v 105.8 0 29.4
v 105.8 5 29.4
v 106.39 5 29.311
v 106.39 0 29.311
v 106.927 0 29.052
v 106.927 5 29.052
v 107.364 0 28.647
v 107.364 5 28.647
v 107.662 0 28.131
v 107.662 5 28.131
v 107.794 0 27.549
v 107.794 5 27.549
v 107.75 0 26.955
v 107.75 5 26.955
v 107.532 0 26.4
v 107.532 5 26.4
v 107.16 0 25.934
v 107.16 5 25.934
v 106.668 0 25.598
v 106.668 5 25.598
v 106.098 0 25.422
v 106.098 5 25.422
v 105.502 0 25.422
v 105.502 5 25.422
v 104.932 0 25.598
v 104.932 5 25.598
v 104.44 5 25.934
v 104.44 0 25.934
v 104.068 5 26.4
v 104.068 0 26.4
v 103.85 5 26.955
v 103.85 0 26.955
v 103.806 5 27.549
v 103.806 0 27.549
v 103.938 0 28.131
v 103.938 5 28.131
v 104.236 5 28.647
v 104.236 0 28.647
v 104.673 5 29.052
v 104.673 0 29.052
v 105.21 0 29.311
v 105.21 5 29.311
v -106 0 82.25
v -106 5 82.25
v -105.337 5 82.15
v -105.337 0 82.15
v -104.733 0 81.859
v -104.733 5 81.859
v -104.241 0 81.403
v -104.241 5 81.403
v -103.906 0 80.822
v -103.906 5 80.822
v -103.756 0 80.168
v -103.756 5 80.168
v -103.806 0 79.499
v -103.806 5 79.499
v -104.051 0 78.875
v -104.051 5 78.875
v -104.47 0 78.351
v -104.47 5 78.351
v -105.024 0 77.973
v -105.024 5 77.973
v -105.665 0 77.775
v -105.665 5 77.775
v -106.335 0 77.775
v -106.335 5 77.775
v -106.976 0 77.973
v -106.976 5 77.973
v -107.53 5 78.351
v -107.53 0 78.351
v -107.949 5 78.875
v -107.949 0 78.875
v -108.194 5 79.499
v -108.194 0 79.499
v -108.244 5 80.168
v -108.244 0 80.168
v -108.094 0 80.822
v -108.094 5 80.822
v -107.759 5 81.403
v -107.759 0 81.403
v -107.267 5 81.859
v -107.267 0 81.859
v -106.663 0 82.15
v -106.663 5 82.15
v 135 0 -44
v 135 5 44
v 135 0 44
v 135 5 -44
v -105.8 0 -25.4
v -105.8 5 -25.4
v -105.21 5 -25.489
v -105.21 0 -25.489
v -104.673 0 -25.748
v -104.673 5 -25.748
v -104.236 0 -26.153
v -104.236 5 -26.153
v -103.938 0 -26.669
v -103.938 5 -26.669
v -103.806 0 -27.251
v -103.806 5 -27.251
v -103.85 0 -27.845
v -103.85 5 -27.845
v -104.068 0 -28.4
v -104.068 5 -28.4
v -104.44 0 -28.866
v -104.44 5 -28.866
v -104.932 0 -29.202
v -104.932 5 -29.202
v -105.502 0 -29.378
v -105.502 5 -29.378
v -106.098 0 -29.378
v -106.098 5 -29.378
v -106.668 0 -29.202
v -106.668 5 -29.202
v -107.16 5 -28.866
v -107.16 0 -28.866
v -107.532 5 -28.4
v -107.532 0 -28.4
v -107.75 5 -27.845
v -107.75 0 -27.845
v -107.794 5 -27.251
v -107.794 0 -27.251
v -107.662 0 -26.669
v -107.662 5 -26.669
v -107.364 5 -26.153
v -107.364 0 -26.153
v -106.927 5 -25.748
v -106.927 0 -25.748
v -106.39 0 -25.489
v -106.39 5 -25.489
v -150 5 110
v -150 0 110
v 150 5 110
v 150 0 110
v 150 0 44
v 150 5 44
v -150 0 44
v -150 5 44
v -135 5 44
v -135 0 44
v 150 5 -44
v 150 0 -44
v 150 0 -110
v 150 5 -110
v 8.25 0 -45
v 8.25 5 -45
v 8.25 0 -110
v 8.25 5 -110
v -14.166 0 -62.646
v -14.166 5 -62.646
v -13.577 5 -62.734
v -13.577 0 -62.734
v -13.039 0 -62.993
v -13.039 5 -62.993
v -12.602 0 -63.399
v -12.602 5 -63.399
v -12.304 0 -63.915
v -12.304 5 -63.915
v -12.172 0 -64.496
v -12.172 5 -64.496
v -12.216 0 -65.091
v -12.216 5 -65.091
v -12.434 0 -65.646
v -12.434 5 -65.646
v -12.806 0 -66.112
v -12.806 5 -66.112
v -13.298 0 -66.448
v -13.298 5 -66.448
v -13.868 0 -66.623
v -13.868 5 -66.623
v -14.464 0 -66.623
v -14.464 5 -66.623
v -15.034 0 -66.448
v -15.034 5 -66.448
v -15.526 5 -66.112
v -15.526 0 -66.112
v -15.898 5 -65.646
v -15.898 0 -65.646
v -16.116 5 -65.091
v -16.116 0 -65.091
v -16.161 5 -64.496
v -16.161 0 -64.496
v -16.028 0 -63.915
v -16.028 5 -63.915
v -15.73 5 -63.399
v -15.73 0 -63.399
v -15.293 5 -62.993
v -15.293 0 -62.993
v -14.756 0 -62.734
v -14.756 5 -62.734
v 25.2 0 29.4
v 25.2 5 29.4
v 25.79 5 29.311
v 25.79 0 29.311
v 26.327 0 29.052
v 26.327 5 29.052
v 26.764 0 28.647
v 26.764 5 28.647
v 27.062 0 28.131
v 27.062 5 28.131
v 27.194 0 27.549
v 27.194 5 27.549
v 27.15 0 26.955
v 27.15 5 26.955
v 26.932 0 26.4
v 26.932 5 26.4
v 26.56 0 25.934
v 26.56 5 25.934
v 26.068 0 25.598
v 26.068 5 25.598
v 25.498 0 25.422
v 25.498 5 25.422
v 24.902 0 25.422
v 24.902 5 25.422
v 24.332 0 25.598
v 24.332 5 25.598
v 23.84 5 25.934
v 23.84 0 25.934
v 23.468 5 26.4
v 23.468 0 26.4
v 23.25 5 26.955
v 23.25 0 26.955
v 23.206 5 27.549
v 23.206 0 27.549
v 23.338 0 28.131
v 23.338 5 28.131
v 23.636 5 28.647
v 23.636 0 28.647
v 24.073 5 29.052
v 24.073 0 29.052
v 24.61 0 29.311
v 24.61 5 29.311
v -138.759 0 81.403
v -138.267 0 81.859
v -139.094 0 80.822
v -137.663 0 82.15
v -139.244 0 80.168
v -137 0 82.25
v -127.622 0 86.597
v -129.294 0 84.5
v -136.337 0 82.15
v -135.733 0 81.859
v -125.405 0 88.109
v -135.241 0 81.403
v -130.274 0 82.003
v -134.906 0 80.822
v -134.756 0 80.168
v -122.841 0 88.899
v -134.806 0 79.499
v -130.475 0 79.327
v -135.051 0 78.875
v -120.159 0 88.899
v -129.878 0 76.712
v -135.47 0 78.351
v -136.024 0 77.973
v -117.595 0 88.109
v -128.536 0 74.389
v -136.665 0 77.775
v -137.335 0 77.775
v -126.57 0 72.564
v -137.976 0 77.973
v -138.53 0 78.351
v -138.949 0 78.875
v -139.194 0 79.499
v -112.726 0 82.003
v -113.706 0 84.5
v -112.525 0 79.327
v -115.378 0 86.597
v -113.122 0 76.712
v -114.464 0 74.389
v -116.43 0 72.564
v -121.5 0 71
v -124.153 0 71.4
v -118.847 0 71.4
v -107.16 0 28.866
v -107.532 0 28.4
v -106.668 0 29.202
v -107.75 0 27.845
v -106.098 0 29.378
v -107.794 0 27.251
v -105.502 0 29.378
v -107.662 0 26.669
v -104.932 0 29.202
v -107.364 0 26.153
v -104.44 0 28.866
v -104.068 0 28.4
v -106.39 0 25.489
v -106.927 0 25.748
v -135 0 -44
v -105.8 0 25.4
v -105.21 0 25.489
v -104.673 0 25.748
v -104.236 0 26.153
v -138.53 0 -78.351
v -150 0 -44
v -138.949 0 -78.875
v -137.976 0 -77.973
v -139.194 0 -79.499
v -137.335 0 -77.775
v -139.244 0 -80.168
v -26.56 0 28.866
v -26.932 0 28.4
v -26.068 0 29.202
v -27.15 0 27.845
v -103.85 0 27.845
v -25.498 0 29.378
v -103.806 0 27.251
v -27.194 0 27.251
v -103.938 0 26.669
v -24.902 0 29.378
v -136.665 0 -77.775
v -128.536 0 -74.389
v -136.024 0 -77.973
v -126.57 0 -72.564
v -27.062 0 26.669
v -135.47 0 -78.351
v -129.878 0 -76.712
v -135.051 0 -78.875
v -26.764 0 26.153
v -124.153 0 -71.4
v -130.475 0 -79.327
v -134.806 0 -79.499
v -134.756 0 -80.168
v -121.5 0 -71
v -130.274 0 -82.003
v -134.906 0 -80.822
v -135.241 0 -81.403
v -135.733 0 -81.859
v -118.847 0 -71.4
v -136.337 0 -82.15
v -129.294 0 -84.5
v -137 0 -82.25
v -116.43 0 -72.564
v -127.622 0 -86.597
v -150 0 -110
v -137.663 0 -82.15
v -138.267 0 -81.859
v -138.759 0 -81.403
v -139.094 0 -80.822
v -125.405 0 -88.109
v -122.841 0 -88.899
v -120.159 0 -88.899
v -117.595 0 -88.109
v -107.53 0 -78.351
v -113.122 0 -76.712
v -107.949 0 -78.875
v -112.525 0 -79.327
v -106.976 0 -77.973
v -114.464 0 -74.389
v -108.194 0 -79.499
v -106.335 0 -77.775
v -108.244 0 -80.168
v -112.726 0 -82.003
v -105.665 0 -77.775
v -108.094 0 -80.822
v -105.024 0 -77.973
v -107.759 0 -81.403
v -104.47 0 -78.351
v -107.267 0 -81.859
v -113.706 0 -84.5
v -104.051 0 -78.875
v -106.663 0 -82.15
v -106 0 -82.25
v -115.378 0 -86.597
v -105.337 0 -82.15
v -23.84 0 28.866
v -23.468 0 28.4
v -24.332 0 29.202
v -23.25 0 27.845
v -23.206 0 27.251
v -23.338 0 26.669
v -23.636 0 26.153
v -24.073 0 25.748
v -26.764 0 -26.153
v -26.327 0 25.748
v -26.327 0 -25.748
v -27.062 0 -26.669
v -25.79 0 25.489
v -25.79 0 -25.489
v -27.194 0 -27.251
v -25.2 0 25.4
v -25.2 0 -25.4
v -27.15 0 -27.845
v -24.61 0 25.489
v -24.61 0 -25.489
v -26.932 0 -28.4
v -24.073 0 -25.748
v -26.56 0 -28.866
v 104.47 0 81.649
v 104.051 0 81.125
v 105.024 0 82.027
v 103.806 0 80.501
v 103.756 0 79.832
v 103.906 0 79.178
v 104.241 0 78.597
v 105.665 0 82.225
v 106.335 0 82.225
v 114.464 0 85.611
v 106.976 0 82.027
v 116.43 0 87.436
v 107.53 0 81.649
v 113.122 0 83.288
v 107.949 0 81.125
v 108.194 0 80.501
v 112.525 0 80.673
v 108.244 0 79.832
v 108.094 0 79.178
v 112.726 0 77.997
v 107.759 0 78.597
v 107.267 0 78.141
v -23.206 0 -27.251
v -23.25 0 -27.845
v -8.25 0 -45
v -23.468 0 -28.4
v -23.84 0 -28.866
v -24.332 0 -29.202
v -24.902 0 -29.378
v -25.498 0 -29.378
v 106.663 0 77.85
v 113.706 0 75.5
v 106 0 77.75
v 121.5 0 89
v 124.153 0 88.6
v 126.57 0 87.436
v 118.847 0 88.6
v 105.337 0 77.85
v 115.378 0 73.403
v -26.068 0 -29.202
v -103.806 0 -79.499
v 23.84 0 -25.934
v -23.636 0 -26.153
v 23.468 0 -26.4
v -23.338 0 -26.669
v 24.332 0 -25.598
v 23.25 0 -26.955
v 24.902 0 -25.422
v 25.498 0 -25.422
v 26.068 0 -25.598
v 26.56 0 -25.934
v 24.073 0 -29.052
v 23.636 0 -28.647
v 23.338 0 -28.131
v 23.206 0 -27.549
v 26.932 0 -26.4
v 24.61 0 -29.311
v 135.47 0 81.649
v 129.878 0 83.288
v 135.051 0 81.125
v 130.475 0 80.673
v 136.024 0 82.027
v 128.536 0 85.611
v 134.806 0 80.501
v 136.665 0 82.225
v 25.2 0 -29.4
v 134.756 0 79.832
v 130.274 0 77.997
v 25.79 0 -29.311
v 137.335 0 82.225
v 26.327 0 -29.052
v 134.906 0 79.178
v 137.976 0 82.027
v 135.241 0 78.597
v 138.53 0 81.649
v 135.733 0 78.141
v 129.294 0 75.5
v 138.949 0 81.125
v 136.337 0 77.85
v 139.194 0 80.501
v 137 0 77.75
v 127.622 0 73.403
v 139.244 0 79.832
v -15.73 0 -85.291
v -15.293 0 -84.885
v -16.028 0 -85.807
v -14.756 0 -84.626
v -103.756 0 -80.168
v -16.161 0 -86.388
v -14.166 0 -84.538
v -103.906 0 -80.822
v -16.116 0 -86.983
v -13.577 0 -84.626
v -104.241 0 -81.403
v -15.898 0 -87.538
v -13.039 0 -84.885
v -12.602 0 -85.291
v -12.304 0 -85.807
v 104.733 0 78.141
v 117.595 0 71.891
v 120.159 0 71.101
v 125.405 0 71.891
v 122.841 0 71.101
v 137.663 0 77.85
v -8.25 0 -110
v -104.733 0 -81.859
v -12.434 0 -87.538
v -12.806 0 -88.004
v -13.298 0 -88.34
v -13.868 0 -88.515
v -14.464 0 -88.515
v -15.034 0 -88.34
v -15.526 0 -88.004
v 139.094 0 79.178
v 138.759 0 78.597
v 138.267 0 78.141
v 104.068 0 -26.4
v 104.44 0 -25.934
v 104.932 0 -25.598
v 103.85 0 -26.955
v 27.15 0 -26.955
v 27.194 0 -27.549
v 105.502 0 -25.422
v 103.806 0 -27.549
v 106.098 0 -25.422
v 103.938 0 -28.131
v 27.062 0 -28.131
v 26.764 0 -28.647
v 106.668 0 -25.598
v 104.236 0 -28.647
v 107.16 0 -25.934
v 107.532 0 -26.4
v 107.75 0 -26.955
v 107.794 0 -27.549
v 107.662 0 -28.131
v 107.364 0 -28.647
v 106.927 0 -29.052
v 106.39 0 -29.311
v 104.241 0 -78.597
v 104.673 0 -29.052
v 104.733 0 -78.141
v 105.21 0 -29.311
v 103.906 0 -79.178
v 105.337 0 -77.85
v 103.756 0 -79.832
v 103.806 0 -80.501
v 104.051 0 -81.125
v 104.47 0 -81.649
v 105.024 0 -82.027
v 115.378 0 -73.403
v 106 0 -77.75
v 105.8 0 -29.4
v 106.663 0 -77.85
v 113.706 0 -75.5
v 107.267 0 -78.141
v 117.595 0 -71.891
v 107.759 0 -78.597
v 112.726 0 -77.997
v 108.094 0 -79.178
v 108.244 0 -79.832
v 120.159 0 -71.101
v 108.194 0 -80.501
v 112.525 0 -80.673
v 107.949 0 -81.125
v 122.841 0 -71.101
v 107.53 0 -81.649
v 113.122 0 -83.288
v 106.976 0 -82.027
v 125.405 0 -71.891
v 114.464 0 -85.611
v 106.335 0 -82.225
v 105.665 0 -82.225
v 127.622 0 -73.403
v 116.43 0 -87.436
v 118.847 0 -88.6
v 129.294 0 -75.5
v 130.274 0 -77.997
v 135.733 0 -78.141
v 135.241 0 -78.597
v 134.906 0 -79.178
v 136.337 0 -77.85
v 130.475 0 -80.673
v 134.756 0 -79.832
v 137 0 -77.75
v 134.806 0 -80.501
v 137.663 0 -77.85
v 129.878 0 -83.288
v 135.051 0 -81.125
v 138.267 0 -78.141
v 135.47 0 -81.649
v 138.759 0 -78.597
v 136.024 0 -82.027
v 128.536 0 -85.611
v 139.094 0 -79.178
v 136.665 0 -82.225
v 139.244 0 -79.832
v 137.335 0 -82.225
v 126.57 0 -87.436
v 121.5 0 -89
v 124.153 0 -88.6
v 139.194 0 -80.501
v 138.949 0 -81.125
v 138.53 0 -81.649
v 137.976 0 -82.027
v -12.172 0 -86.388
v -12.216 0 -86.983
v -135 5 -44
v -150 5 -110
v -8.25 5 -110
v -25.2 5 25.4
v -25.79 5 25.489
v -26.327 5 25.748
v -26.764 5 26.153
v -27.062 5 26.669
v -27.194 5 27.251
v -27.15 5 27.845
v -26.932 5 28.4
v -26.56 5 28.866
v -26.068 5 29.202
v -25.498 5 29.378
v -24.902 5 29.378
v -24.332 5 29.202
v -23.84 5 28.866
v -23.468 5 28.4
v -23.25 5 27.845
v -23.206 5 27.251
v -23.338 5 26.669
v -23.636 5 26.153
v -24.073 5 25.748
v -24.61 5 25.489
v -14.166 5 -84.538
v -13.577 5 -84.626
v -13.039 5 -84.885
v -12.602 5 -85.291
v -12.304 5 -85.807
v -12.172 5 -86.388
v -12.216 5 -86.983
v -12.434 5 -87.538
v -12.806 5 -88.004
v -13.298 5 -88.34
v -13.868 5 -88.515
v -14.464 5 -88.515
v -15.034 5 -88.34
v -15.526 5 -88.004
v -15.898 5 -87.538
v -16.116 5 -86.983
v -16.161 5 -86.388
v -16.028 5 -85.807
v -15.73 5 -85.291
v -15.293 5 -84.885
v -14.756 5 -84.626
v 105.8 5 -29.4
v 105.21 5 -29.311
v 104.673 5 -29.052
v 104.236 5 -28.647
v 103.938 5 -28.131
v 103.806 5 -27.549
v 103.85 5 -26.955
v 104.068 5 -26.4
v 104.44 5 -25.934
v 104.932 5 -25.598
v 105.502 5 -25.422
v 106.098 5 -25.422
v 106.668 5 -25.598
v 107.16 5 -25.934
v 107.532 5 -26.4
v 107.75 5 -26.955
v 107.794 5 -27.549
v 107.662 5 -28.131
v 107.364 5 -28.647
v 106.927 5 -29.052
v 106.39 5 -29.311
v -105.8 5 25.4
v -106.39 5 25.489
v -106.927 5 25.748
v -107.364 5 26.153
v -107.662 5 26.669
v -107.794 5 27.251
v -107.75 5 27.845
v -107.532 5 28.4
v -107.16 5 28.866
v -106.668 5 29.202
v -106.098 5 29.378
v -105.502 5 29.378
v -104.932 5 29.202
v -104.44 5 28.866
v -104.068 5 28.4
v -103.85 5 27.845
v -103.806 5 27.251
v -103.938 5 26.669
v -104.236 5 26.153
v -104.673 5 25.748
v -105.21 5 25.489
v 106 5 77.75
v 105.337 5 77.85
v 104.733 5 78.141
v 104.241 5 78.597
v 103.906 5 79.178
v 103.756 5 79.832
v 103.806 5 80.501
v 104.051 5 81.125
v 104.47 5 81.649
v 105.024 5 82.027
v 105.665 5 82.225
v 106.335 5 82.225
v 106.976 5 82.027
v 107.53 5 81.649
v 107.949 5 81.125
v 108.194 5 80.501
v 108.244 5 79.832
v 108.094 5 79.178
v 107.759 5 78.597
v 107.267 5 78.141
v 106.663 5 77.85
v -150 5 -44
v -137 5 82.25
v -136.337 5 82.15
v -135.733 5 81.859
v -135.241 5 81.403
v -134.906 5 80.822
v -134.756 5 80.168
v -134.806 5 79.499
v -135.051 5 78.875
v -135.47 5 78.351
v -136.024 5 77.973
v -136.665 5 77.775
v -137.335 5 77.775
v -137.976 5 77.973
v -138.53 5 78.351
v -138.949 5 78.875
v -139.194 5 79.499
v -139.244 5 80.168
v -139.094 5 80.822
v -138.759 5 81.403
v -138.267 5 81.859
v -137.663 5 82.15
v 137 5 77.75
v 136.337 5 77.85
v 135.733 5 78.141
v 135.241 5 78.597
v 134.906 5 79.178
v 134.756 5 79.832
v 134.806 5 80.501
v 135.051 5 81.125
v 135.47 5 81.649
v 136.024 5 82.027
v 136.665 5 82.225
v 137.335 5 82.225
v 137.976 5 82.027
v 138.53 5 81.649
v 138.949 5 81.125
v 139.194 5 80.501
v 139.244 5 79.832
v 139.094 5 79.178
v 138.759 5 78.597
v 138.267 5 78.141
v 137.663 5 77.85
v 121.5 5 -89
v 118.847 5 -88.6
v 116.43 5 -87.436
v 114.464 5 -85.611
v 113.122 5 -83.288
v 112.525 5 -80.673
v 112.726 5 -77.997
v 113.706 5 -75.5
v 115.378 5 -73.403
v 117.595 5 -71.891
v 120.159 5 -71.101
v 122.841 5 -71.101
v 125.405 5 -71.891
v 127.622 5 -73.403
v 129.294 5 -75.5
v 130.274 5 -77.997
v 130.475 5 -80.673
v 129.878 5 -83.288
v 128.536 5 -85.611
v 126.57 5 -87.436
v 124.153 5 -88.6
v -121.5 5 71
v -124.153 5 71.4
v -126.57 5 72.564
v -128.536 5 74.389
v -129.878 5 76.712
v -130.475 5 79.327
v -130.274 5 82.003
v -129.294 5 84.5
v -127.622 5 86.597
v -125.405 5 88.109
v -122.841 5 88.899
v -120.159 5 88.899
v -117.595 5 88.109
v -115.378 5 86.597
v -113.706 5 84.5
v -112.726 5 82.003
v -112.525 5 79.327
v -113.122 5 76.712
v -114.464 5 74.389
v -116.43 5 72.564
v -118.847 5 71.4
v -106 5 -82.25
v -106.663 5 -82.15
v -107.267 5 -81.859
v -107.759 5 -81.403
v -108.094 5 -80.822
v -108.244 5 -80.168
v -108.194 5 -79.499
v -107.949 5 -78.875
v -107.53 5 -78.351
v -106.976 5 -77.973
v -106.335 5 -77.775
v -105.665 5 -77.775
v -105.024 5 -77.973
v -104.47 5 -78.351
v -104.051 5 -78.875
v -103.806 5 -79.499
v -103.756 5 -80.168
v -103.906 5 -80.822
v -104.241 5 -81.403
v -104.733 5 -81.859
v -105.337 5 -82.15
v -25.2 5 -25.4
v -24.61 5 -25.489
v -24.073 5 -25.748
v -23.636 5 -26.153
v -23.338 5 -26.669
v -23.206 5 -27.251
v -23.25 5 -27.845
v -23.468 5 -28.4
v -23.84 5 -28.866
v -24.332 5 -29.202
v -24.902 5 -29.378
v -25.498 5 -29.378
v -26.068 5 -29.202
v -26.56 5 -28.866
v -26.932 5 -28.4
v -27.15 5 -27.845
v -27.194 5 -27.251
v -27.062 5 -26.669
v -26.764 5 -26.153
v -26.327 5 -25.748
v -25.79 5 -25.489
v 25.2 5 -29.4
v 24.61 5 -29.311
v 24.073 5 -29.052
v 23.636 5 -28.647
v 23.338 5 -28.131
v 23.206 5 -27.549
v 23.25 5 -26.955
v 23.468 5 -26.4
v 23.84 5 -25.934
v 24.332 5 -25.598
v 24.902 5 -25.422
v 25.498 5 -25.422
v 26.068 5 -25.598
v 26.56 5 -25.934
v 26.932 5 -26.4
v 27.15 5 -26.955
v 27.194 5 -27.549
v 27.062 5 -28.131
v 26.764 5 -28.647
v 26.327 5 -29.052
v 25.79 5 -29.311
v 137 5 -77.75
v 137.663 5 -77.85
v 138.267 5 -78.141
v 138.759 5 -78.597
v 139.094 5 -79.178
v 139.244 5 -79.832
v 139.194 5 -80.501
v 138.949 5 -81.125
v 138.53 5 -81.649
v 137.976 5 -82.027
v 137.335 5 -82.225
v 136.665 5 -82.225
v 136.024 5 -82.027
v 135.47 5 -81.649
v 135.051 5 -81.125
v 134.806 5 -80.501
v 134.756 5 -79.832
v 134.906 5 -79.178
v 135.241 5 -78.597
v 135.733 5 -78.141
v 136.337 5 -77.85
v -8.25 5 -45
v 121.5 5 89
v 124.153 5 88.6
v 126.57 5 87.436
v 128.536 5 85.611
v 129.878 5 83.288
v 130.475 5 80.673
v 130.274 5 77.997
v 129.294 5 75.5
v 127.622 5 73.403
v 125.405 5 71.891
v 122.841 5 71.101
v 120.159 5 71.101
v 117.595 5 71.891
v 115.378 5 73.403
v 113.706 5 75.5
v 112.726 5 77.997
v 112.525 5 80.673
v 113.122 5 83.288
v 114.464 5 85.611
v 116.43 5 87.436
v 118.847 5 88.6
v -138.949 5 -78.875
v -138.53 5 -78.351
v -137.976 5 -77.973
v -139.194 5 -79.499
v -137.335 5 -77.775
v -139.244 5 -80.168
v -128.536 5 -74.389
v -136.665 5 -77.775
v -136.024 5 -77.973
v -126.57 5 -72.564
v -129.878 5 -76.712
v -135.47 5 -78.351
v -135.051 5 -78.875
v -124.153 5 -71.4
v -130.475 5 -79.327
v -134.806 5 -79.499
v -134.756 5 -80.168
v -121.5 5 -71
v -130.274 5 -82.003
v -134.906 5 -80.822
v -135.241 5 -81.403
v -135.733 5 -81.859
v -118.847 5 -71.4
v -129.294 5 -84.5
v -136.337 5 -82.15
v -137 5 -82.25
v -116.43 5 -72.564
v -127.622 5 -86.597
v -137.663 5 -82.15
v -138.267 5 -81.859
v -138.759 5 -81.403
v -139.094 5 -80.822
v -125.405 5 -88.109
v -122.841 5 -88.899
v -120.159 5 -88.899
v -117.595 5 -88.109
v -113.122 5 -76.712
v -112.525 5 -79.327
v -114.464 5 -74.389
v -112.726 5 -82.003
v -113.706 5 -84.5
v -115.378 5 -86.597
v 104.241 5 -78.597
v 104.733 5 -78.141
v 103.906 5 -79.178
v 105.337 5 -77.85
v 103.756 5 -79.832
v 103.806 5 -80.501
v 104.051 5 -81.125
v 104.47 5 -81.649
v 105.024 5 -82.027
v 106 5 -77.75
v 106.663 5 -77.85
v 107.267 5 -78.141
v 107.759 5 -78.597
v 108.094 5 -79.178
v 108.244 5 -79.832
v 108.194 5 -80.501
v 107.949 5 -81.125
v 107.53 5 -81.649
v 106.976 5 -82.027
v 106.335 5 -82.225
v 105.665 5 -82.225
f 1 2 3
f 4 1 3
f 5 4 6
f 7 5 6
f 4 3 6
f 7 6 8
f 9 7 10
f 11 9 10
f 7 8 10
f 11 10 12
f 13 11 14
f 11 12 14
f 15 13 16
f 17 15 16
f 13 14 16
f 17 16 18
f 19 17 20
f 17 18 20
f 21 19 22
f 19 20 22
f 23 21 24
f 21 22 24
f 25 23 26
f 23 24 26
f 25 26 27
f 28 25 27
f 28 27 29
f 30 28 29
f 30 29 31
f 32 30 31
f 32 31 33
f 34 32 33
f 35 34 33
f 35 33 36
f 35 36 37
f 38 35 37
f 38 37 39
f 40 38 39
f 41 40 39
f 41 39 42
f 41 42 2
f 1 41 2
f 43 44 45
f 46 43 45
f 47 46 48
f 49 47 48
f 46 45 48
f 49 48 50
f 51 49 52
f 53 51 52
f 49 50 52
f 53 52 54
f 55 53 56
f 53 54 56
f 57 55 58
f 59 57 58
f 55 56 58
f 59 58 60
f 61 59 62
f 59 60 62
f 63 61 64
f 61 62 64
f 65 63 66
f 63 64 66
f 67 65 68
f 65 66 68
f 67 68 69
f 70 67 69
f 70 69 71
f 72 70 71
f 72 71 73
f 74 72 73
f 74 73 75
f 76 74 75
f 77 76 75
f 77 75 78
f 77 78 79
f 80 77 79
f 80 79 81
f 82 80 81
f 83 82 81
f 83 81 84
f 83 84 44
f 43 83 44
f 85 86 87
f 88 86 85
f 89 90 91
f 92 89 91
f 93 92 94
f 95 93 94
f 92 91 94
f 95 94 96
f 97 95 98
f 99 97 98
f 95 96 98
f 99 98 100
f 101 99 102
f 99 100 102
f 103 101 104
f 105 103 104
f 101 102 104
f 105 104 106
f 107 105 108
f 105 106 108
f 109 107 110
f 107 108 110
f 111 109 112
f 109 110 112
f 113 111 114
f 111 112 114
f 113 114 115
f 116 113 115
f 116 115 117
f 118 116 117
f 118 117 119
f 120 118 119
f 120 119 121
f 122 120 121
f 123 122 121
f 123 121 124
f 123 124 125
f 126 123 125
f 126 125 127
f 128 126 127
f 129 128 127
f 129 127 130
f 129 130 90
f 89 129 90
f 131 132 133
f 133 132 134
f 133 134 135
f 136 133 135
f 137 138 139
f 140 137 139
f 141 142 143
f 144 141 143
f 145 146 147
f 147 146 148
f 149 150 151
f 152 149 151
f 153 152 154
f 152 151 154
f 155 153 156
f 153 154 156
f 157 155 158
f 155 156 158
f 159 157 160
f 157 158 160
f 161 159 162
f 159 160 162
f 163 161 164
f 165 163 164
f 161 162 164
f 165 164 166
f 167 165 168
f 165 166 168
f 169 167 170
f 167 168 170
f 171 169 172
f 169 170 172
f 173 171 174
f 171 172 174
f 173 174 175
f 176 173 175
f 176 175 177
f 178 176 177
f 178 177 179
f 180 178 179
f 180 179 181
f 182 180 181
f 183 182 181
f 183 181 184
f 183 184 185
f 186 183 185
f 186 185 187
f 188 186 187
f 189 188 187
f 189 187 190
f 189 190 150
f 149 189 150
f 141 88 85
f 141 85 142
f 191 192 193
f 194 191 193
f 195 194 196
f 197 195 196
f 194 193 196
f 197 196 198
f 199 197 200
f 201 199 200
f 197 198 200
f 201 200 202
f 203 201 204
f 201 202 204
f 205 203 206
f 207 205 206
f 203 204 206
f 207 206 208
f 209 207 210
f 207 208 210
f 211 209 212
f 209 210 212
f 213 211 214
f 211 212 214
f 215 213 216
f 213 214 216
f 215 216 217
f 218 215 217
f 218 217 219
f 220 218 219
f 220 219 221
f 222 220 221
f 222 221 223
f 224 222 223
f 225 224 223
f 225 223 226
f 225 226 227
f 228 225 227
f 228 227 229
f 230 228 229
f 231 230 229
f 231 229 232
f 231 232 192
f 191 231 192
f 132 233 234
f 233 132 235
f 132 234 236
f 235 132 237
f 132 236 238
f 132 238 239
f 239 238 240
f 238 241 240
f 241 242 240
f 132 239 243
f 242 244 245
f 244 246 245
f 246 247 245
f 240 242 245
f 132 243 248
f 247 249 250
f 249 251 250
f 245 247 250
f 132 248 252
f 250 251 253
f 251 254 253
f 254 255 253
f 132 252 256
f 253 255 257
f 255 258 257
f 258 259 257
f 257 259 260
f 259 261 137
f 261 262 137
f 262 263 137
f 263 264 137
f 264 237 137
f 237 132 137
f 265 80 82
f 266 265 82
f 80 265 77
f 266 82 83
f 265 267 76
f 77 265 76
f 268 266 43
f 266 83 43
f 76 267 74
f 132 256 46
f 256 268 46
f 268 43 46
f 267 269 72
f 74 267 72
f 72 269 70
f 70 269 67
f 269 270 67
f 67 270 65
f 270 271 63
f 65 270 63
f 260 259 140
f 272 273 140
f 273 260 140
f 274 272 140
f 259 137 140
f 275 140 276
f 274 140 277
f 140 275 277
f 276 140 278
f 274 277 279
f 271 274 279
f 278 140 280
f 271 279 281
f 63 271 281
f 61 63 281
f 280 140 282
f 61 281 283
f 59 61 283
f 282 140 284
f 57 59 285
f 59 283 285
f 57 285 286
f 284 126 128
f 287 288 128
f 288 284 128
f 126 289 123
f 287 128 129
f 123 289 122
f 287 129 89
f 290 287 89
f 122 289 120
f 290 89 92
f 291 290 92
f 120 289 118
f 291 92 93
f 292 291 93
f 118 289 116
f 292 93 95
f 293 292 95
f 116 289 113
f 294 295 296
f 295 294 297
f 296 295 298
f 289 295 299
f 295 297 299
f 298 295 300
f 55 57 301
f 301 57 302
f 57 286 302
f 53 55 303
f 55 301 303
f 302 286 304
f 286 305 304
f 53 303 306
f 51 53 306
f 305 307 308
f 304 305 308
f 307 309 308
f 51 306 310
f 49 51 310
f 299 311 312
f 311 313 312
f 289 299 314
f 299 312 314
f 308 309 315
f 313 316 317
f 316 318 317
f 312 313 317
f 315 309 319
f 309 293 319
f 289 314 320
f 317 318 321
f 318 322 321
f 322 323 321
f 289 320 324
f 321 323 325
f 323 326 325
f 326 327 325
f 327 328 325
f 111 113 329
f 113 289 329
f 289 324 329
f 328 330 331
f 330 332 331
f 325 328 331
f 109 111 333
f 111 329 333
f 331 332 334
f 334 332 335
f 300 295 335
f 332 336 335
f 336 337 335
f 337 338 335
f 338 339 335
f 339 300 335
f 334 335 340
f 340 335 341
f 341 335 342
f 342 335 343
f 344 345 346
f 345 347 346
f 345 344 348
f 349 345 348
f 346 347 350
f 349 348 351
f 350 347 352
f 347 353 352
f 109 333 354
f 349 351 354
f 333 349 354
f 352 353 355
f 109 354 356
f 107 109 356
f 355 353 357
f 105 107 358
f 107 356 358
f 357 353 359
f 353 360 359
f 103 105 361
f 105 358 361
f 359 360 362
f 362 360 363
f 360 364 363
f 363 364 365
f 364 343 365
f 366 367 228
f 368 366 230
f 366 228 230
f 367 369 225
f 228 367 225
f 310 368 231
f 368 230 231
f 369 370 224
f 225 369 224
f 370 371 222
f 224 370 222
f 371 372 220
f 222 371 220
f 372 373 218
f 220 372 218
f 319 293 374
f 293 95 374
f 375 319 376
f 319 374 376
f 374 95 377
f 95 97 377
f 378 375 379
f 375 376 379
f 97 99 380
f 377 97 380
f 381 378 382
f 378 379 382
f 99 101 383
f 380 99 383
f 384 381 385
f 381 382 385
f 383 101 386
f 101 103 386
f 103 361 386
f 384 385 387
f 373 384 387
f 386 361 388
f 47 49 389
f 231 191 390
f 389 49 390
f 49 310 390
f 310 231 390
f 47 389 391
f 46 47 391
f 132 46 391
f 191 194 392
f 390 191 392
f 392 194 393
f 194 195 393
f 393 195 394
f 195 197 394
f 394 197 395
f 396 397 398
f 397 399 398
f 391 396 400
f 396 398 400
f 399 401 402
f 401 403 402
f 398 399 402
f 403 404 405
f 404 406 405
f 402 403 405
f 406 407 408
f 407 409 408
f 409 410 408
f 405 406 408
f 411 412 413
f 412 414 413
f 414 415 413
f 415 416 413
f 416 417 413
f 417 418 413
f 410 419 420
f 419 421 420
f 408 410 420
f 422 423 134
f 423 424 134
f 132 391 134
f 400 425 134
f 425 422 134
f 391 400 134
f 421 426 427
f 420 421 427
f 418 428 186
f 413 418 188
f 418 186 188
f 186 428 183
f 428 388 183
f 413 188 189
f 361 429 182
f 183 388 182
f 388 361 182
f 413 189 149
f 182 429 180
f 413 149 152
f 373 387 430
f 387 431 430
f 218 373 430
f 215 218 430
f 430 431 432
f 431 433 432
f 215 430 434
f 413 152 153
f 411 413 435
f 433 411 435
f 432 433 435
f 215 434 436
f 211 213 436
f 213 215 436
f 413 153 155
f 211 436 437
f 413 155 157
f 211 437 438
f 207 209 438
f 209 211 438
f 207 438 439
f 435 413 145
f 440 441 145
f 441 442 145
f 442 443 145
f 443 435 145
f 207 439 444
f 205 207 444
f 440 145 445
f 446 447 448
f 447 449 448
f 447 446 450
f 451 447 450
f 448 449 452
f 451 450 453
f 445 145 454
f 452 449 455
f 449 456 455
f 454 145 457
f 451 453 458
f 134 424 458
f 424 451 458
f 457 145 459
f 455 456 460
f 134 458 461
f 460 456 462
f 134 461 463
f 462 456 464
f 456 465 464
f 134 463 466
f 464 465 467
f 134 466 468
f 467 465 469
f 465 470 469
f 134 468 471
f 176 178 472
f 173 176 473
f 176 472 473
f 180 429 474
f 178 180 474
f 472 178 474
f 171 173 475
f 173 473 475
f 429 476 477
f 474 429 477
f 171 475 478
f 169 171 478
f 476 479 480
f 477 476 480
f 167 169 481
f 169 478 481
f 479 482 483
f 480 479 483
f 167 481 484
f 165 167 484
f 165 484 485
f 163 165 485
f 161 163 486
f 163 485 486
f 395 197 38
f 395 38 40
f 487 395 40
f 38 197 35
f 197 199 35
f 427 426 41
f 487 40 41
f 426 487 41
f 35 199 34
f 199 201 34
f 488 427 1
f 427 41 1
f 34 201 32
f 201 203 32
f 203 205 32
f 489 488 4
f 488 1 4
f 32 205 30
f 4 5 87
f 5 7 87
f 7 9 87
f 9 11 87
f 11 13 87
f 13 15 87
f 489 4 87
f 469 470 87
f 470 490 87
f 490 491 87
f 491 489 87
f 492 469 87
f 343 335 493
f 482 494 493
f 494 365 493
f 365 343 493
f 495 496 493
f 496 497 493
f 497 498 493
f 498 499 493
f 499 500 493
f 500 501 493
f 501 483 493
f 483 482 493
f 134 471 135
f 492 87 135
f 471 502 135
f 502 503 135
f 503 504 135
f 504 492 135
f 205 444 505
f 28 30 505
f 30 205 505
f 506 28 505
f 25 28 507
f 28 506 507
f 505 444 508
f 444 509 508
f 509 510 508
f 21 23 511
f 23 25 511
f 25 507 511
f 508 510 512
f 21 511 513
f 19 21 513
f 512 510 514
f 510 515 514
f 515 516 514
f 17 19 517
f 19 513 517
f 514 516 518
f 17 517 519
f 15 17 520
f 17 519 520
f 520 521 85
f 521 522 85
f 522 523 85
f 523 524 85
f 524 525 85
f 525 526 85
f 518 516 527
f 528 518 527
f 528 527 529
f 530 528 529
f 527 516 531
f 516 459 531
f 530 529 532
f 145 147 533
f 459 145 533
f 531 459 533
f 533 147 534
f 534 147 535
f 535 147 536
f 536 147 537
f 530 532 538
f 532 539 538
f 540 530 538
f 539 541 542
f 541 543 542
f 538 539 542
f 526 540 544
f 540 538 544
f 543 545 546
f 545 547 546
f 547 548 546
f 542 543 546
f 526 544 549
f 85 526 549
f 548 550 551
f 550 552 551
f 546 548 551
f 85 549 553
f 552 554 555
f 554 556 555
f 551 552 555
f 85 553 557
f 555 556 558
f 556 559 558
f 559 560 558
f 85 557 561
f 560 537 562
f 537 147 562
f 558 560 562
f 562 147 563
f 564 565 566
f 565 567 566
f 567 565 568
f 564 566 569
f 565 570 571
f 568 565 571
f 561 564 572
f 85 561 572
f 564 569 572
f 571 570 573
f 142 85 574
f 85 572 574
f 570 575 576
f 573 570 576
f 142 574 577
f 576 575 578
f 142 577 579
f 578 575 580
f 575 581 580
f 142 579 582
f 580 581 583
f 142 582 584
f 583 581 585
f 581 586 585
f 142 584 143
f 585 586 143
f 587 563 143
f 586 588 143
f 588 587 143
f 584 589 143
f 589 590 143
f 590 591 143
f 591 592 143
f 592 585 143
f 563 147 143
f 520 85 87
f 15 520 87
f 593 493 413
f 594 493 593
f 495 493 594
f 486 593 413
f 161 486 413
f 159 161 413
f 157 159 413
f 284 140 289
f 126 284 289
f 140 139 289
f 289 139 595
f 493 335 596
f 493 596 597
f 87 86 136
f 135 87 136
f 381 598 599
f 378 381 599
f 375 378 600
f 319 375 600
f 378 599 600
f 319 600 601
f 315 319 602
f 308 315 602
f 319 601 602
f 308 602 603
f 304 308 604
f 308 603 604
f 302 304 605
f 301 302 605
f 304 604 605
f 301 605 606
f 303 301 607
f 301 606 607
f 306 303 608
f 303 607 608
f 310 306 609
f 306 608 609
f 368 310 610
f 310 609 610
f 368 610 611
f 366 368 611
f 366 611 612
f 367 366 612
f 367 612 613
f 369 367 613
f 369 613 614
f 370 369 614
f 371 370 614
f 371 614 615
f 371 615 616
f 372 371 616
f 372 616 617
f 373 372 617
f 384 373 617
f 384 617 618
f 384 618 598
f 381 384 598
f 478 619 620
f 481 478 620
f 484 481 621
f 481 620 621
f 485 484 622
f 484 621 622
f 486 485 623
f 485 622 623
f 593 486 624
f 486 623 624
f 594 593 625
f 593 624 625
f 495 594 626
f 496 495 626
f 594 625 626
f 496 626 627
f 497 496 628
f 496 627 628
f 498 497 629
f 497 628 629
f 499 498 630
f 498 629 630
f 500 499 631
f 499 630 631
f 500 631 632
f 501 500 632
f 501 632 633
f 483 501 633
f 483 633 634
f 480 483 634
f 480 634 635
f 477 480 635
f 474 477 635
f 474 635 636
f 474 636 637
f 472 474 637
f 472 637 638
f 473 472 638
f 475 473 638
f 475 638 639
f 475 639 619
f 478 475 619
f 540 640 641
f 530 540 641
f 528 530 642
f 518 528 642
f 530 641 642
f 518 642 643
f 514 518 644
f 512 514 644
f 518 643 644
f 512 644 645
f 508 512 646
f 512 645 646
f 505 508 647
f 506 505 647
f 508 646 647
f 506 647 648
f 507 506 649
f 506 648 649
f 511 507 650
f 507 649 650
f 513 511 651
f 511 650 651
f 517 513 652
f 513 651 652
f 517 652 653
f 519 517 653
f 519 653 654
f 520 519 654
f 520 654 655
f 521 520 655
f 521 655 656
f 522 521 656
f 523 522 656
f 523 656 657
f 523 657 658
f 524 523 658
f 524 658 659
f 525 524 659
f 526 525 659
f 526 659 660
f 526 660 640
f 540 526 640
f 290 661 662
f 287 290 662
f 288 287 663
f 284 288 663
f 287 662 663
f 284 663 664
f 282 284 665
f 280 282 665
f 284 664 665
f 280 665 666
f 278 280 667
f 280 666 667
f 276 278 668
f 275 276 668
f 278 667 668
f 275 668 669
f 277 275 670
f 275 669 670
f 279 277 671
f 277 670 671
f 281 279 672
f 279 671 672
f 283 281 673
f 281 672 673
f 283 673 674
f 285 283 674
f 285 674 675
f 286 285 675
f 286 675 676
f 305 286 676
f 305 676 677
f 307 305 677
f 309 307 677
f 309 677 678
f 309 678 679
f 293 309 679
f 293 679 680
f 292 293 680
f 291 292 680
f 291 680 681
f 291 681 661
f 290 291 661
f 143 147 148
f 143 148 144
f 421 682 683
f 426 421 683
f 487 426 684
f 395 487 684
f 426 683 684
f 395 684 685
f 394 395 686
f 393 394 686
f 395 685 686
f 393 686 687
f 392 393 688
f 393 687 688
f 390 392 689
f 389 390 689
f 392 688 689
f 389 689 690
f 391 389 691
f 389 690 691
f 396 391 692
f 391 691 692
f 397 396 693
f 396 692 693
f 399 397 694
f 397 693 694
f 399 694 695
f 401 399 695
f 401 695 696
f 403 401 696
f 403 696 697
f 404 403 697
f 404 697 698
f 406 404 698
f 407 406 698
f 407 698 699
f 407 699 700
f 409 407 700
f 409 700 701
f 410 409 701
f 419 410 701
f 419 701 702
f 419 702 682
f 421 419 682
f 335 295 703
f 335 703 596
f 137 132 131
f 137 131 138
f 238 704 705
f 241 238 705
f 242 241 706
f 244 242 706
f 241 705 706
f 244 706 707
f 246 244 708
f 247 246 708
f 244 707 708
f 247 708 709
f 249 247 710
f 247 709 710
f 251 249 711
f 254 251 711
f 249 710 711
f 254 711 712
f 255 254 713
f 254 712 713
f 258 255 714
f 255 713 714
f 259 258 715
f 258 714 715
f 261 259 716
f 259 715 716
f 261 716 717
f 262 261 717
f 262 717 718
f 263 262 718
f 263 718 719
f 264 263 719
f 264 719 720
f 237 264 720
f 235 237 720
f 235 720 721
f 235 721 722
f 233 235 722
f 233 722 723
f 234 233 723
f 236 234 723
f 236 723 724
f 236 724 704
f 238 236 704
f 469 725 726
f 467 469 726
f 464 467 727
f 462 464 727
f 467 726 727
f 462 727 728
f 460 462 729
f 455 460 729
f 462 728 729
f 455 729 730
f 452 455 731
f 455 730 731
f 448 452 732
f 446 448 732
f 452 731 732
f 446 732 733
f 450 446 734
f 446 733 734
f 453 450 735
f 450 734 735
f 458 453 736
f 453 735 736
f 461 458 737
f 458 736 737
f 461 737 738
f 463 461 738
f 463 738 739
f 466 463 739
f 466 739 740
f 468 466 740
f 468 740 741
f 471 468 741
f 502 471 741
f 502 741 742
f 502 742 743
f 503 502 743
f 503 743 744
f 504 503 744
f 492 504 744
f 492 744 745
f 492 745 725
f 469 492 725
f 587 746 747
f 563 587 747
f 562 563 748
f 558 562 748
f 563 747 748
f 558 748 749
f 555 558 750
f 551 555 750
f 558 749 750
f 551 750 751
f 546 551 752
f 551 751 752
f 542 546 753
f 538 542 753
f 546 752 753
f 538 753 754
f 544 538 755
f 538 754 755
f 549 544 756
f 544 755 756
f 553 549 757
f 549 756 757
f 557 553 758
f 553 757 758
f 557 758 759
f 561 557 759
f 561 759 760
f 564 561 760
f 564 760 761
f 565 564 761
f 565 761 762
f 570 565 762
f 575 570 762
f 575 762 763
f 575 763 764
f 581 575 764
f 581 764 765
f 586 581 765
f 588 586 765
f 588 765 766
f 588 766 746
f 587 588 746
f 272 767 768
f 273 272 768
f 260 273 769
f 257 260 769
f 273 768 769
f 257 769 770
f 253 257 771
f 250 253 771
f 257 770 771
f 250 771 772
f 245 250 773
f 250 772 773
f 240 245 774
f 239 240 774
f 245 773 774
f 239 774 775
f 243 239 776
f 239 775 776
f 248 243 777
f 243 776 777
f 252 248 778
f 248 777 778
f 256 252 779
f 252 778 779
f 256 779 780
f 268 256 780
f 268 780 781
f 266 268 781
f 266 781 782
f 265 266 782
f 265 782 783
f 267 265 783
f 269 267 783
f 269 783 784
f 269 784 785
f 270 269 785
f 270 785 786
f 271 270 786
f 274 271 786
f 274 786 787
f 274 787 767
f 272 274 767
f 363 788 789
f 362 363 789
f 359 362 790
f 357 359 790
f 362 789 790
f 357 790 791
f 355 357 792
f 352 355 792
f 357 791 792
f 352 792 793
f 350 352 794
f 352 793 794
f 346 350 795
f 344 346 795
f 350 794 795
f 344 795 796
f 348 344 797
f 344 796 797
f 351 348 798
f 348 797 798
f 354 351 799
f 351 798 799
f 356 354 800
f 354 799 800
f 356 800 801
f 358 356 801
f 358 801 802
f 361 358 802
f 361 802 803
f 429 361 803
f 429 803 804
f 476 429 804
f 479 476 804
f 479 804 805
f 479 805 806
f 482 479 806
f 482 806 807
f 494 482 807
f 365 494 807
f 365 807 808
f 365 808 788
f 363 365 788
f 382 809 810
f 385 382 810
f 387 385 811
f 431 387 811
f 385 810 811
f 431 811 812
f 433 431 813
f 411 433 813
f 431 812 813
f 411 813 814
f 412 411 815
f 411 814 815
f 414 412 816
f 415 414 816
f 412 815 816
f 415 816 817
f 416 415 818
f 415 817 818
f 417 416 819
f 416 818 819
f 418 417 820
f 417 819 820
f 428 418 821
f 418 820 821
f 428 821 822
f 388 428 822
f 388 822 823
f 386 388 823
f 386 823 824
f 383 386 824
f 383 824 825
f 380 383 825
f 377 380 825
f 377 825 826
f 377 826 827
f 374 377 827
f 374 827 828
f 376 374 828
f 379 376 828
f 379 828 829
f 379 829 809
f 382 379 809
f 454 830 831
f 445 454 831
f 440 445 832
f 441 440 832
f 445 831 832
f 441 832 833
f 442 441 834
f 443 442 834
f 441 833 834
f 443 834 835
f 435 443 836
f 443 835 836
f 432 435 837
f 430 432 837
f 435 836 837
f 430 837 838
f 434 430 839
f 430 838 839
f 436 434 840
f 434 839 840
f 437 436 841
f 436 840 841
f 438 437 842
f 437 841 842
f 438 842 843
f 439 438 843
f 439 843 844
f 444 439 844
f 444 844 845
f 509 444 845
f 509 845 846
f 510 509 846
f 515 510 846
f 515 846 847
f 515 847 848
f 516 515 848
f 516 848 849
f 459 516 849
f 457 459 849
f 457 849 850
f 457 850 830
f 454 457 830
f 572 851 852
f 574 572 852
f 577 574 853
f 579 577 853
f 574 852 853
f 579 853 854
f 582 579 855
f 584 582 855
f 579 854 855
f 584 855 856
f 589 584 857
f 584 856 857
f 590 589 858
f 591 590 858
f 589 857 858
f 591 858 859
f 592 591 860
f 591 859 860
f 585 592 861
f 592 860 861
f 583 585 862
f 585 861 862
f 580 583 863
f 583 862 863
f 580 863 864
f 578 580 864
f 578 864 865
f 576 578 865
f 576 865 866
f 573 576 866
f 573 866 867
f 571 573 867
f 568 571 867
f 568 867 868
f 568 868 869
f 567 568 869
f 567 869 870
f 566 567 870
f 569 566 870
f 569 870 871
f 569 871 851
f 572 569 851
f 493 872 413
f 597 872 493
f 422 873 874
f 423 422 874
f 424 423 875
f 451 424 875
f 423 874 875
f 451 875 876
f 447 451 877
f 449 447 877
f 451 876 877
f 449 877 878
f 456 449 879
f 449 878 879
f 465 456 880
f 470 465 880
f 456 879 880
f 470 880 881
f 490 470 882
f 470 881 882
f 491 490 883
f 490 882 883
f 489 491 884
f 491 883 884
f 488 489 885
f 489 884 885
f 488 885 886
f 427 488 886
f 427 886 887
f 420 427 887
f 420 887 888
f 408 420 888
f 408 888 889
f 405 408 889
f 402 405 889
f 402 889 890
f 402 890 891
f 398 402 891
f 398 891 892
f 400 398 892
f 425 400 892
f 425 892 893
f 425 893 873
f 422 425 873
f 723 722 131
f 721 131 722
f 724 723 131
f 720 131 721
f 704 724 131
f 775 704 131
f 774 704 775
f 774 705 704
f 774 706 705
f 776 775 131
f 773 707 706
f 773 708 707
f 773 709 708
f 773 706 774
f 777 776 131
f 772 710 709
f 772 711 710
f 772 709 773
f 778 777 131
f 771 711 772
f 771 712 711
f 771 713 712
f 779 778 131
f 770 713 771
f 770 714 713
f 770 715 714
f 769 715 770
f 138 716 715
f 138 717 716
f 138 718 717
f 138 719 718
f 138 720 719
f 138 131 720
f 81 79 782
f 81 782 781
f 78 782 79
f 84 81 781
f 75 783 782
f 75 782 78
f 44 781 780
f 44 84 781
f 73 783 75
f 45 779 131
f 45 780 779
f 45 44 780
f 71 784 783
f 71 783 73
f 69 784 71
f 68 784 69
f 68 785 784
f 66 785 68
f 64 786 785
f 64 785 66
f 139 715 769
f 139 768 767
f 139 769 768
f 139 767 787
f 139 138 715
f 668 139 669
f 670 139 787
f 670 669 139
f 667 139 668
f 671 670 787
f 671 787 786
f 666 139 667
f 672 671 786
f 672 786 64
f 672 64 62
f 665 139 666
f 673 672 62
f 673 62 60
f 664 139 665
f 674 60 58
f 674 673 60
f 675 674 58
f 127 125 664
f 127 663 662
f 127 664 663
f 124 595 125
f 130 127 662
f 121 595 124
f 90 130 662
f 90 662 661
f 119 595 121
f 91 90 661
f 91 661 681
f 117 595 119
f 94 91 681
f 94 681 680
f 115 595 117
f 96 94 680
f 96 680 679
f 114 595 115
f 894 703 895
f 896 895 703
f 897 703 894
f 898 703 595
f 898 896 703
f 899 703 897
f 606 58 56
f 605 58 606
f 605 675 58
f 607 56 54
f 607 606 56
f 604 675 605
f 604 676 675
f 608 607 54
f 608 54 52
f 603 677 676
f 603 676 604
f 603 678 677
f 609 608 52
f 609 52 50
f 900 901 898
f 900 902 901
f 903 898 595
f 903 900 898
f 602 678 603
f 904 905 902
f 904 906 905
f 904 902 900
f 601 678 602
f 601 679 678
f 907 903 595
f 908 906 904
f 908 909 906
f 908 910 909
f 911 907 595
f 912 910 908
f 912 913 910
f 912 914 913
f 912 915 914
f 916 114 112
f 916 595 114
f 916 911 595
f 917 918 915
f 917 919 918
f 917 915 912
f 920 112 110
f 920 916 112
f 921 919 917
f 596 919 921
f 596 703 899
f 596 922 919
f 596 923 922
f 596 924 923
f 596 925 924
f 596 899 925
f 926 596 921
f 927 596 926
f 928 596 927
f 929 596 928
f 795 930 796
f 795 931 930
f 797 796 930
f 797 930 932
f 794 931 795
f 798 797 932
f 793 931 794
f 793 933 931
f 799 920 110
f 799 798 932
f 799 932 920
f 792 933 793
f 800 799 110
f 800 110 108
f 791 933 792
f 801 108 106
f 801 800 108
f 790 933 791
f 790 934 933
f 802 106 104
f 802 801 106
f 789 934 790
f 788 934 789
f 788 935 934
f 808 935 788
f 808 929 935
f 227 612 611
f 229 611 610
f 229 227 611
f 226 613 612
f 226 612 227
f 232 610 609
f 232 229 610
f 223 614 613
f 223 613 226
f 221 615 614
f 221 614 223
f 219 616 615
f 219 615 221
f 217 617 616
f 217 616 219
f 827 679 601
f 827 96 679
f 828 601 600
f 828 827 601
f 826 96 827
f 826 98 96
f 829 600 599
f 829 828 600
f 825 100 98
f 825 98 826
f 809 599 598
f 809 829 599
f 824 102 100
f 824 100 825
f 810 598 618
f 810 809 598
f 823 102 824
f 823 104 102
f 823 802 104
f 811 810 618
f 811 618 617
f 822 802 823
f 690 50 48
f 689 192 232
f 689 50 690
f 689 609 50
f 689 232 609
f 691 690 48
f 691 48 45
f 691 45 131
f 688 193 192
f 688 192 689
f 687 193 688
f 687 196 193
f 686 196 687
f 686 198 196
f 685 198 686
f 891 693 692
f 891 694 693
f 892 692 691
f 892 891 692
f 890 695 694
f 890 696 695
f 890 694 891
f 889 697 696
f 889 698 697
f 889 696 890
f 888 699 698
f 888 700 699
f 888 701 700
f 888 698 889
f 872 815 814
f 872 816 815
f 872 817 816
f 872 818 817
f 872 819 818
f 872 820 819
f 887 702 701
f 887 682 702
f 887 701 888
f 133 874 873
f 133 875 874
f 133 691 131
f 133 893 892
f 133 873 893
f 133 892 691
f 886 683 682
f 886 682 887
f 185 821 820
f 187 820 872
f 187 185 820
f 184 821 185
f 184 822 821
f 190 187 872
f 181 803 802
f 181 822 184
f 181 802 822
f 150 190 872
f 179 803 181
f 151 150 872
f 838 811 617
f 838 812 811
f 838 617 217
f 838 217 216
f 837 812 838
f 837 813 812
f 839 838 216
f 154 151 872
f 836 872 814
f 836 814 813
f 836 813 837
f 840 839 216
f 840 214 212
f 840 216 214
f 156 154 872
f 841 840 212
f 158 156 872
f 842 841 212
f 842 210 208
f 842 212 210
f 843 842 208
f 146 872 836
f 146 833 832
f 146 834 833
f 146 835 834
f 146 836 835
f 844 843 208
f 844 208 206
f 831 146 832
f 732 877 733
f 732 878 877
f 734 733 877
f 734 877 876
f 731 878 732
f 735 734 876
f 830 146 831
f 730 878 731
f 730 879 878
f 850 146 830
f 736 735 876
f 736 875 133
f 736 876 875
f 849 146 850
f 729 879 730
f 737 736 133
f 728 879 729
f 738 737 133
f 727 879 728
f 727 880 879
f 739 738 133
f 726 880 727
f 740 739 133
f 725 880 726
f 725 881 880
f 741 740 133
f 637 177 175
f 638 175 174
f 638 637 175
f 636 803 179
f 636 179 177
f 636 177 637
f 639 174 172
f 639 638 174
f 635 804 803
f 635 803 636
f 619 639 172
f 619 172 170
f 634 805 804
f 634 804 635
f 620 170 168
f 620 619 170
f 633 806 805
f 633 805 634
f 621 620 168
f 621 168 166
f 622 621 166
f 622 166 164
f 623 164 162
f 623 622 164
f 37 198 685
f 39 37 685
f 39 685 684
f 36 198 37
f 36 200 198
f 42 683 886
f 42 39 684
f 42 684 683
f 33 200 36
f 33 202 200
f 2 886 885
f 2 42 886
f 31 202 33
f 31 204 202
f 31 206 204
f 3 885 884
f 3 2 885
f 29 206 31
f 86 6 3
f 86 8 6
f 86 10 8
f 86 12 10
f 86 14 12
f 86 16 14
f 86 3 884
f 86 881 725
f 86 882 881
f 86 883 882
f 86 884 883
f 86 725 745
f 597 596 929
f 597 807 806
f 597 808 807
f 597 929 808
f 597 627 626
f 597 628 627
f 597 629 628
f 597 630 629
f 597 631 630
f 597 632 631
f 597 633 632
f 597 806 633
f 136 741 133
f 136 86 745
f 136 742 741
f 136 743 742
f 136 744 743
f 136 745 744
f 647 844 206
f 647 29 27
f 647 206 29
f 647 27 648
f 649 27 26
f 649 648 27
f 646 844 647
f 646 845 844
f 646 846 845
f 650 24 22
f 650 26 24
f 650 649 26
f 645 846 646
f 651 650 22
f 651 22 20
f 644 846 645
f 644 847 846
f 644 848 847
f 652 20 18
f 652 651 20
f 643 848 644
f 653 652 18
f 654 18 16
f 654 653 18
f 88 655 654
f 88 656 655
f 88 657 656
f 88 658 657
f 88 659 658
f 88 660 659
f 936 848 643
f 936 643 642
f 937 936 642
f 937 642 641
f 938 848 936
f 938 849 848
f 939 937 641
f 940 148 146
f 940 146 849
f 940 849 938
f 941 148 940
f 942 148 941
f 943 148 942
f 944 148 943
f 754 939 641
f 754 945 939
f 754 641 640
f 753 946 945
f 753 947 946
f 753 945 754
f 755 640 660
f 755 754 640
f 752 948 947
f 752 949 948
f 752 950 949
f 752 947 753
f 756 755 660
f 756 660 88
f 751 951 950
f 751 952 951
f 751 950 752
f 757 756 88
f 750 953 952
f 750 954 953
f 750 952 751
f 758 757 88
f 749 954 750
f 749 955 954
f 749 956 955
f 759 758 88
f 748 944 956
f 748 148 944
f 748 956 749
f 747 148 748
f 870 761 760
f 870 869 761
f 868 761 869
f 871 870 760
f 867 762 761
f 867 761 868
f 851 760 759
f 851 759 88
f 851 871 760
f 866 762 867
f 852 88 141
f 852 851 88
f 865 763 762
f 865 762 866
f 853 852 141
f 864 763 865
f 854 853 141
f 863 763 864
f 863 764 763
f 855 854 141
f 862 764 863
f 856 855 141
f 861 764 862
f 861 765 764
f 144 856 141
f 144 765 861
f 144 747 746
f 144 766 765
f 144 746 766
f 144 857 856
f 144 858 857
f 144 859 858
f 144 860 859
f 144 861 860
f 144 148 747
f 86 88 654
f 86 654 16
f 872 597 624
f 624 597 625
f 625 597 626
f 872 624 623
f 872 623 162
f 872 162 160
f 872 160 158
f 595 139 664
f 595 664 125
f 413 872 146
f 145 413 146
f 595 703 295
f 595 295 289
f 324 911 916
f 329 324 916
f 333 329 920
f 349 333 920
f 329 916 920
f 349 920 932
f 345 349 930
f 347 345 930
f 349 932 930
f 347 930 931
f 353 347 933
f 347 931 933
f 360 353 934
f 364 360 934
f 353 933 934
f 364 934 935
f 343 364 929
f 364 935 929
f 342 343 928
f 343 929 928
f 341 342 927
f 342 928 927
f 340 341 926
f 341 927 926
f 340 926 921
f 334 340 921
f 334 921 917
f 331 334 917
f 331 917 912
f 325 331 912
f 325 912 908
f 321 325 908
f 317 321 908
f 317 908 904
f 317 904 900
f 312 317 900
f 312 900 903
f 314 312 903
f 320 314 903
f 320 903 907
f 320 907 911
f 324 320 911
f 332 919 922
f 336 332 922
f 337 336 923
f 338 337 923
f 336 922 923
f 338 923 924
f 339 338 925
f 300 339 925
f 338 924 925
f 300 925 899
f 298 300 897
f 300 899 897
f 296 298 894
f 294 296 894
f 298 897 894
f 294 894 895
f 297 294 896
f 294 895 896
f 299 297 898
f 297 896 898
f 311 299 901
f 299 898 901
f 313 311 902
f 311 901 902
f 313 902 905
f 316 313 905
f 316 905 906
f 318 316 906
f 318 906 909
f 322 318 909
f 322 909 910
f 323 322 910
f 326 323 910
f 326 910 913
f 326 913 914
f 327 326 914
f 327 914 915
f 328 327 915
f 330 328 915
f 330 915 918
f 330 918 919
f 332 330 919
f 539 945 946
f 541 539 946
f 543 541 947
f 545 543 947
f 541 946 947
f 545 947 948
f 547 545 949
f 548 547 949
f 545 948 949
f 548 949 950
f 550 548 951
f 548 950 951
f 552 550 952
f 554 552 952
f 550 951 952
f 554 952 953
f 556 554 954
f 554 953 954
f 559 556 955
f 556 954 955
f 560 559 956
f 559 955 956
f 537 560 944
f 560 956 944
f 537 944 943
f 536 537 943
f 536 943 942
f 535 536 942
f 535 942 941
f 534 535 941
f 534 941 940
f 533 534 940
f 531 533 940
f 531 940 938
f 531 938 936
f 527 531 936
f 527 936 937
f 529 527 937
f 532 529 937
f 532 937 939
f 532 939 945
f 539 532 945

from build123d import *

# Parameters (mm, degrees)
SKETCH1_W               = 300
SKETCH1_H               = 220
BOSS_EXTRUDE1_DEPTH     = 5
SKETCH2_W               = 15
SKETCH2_H               = 88
CUT_EXTRUDE1_DEPTH      = 10
ESQUISSE2_R             = 2
ENL_V_MAT_EXTRU_1_DEPTH = 10
ESQUISSE4_W             = 16.5
ESQUISSE4_H             = 65
ENL_V_MAT_EXTRU_4_DEPTH = 5
ESQUISSE5_R             = 2
ENL_V_MAT_EXTRU_5_DEPTH = 10
ESQUISSE6_R             = 2.25
ENL_V_MAT_EXTRU_6_DEPTH = 10
ESQUISSE7_R             = 9
ENL_V_MAT_EXTRU_9_DEPTH = 10


with BuildPart() as part:
    # Sketch1 → Boss-Extrude1 (new body)
    with BuildSketch(Plane(origin=(0, 0, 0), x_dir=(1, 0, 0), z_dir=(0, 1, 0))):
        Rectangle(SKETCH1_W, SKETCH1_H)
    extrude(amount=BOSS_EXTRUDE1_DEPTH)

    # Sketch2 → Cut-Extrude1 (cut)
    with BuildSketch(Plane(origin=(0, 5, 0), x_dir=(1, 0, 0), z_dir=(0, 1, 0))):
        with Locations((-142.5, 0)):
            Rectangle(SKETCH2_W, SKETCH2_H)
        with Locations((142.5, 0)):
            Rectangle(SKETCH2_W, SKETCH2_H)
    extrude(amount=-CUT_EXTRUDE1_DEPTH, mode=Mode.SUBTRACT)

    # Esquisse2 → Enlèv. mat.-Extru.1 (cut)
    with BuildSketch(Plane(origin=(0, 5, 0), x_dir=(1, 0, 0), z_dir=(0, 1, 0))):
        with Locations(Location((-105.8, 27.4, 0), (0, 0, 270))):
            Circle(ESQUISSE2_R)
        with Locations(Location((-25.2, 27.4, 0), (0, 0, 270))):
            Circle(ESQUISSE2_R)
        with Locations(Location((-25.2, -27.4, 0), (0, 0, 90))):
            Circle(ESQUISSE2_R)
        with Locations(Location((-105.8, -27.4, 0), (0, 0, 90))):
            Circle(ESQUISSE2_R)
        with Locations(Location((25.2, -27.4, 0), (0, 0, 270))):
            Circle(ESQUISSE2_R)
        with Locations(Location((105.8, -27.4, 0), (0, 0, 270))):
            Circle(ESQUISSE2_R)
        with Locations(Location((25.2, 27.4, 0), (0, 0, 90))):
            Circle(ESQUISSE2_R)
        with Locations(Location((105.8, 27.4, 0), (0, 0, 90))):
            Circle(ESQUISSE2_R)
    extrude(amount=-ENL_V_MAT_EXTRU_1_DEPTH, mode=Mode.SUBTRACT)

    # Esquisse4 → Enlèv. mat.-Extru.4 (cut)
    with BuildSketch(Plane(origin=(0, 5, 0), x_dir=(1, 0, 0), z_dir=(0, 1, 0))):
        with Locations((0, 77.5)):
            Rectangle(ESQUISSE4_W, ESQUISSE4_H)
    extrude(amount=-ENL_V_MAT_EXTRU_4_DEPTH, mode=Mode.SUBTRACT)

    # Esquisse5 → Enlèv. mat.-Extru.5 (cut)
    with BuildSketch(Plane(origin=(0, 5, 0), x_dir=(1, 0, 0), z_dir=(0, 1, 0))):
        with Locations(Location((-14.16612842, 86.53761558, 0), (0, 0, 270))):
            Circle(ESQUISSE5_R)
        with Locations(Location((-14.16612842, 64.64560566, 0), (0, 0, 270))):
            Circle(ESQUISSE5_R)
    extrude(amount=-ENL_V_MAT_EXTRU_5_DEPTH, mode=Mode.SUBTRACT)

    # Esquisse6 → Enlèv. mat.-Extru.6 (cut)
    with BuildSketch(Plane(origin=(0, 5, 0), x_dir=(1, 0, 0), z_dir=(0, 1, 0))):
        with Locations(Location((-137, -80, 0), (0, 0, 270))):
            Circle(ESQUISSE6_R)
        with Locations(Location((-106, -80, 0), (0, 0, 270))):
            Circle(ESQUISSE6_R)
        with Locations(Location((106, -80, 0), (0, 0, 90))):
            Circle(ESQUISSE6_R)
        with Locations(Location((137, -80, 0), (0, 0, 90))):
            Circle(ESQUISSE6_R)
        with Locations(Location((137, 80, 0), (0, 0, 270))):
            Circle(ESQUISSE6_R)
        with Locations(Location((106, 80, 0), (0, 0, 270))):
            Circle(ESQUISSE6_R)
        with Locations(Location((-106, 80, 0), (0, 0, 90))):
            Circle(ESQUISSE6_R)
        with Locations(Location((-137, 80, 0), (0, 0, 90))):
            Circle(ESQUISSE6_R)
    extrude(amount=-ENL_V_MAT_EXTRU_6_DEPTH, mode=Mode.SUBTRACT)

    # Esquisse7 → Enlèv. mat.-Extru.9 (cut)
    with BuildSketch(Plane(origin=(0, 5, 0), x_dir=(1, 0, 0), z_dir=(0, 1, 0))):
        with Locations(Location((-121.5, 80, 0), (0, 0, 270))):
            Circle(ESQUISSE7_R)
        with Locations(Location((-121.5, -80, 0), (0, 0, 90))):
            Circle(ESQUISSE7_R)
        with Locations(Location((121.5, -80, 0), (0, 0, 270))):
            Circle(ESQUISSE7_R)
        with Locations(Location((121.5, 80, 0), (0, 0, 90))):
            Circle(ESQUISSE7_R)
    extrude(amount=-ENL_V_MAT_EXTRU_9_DEPTH, mode=Mode.SUBTRACT)


solid = part.part
